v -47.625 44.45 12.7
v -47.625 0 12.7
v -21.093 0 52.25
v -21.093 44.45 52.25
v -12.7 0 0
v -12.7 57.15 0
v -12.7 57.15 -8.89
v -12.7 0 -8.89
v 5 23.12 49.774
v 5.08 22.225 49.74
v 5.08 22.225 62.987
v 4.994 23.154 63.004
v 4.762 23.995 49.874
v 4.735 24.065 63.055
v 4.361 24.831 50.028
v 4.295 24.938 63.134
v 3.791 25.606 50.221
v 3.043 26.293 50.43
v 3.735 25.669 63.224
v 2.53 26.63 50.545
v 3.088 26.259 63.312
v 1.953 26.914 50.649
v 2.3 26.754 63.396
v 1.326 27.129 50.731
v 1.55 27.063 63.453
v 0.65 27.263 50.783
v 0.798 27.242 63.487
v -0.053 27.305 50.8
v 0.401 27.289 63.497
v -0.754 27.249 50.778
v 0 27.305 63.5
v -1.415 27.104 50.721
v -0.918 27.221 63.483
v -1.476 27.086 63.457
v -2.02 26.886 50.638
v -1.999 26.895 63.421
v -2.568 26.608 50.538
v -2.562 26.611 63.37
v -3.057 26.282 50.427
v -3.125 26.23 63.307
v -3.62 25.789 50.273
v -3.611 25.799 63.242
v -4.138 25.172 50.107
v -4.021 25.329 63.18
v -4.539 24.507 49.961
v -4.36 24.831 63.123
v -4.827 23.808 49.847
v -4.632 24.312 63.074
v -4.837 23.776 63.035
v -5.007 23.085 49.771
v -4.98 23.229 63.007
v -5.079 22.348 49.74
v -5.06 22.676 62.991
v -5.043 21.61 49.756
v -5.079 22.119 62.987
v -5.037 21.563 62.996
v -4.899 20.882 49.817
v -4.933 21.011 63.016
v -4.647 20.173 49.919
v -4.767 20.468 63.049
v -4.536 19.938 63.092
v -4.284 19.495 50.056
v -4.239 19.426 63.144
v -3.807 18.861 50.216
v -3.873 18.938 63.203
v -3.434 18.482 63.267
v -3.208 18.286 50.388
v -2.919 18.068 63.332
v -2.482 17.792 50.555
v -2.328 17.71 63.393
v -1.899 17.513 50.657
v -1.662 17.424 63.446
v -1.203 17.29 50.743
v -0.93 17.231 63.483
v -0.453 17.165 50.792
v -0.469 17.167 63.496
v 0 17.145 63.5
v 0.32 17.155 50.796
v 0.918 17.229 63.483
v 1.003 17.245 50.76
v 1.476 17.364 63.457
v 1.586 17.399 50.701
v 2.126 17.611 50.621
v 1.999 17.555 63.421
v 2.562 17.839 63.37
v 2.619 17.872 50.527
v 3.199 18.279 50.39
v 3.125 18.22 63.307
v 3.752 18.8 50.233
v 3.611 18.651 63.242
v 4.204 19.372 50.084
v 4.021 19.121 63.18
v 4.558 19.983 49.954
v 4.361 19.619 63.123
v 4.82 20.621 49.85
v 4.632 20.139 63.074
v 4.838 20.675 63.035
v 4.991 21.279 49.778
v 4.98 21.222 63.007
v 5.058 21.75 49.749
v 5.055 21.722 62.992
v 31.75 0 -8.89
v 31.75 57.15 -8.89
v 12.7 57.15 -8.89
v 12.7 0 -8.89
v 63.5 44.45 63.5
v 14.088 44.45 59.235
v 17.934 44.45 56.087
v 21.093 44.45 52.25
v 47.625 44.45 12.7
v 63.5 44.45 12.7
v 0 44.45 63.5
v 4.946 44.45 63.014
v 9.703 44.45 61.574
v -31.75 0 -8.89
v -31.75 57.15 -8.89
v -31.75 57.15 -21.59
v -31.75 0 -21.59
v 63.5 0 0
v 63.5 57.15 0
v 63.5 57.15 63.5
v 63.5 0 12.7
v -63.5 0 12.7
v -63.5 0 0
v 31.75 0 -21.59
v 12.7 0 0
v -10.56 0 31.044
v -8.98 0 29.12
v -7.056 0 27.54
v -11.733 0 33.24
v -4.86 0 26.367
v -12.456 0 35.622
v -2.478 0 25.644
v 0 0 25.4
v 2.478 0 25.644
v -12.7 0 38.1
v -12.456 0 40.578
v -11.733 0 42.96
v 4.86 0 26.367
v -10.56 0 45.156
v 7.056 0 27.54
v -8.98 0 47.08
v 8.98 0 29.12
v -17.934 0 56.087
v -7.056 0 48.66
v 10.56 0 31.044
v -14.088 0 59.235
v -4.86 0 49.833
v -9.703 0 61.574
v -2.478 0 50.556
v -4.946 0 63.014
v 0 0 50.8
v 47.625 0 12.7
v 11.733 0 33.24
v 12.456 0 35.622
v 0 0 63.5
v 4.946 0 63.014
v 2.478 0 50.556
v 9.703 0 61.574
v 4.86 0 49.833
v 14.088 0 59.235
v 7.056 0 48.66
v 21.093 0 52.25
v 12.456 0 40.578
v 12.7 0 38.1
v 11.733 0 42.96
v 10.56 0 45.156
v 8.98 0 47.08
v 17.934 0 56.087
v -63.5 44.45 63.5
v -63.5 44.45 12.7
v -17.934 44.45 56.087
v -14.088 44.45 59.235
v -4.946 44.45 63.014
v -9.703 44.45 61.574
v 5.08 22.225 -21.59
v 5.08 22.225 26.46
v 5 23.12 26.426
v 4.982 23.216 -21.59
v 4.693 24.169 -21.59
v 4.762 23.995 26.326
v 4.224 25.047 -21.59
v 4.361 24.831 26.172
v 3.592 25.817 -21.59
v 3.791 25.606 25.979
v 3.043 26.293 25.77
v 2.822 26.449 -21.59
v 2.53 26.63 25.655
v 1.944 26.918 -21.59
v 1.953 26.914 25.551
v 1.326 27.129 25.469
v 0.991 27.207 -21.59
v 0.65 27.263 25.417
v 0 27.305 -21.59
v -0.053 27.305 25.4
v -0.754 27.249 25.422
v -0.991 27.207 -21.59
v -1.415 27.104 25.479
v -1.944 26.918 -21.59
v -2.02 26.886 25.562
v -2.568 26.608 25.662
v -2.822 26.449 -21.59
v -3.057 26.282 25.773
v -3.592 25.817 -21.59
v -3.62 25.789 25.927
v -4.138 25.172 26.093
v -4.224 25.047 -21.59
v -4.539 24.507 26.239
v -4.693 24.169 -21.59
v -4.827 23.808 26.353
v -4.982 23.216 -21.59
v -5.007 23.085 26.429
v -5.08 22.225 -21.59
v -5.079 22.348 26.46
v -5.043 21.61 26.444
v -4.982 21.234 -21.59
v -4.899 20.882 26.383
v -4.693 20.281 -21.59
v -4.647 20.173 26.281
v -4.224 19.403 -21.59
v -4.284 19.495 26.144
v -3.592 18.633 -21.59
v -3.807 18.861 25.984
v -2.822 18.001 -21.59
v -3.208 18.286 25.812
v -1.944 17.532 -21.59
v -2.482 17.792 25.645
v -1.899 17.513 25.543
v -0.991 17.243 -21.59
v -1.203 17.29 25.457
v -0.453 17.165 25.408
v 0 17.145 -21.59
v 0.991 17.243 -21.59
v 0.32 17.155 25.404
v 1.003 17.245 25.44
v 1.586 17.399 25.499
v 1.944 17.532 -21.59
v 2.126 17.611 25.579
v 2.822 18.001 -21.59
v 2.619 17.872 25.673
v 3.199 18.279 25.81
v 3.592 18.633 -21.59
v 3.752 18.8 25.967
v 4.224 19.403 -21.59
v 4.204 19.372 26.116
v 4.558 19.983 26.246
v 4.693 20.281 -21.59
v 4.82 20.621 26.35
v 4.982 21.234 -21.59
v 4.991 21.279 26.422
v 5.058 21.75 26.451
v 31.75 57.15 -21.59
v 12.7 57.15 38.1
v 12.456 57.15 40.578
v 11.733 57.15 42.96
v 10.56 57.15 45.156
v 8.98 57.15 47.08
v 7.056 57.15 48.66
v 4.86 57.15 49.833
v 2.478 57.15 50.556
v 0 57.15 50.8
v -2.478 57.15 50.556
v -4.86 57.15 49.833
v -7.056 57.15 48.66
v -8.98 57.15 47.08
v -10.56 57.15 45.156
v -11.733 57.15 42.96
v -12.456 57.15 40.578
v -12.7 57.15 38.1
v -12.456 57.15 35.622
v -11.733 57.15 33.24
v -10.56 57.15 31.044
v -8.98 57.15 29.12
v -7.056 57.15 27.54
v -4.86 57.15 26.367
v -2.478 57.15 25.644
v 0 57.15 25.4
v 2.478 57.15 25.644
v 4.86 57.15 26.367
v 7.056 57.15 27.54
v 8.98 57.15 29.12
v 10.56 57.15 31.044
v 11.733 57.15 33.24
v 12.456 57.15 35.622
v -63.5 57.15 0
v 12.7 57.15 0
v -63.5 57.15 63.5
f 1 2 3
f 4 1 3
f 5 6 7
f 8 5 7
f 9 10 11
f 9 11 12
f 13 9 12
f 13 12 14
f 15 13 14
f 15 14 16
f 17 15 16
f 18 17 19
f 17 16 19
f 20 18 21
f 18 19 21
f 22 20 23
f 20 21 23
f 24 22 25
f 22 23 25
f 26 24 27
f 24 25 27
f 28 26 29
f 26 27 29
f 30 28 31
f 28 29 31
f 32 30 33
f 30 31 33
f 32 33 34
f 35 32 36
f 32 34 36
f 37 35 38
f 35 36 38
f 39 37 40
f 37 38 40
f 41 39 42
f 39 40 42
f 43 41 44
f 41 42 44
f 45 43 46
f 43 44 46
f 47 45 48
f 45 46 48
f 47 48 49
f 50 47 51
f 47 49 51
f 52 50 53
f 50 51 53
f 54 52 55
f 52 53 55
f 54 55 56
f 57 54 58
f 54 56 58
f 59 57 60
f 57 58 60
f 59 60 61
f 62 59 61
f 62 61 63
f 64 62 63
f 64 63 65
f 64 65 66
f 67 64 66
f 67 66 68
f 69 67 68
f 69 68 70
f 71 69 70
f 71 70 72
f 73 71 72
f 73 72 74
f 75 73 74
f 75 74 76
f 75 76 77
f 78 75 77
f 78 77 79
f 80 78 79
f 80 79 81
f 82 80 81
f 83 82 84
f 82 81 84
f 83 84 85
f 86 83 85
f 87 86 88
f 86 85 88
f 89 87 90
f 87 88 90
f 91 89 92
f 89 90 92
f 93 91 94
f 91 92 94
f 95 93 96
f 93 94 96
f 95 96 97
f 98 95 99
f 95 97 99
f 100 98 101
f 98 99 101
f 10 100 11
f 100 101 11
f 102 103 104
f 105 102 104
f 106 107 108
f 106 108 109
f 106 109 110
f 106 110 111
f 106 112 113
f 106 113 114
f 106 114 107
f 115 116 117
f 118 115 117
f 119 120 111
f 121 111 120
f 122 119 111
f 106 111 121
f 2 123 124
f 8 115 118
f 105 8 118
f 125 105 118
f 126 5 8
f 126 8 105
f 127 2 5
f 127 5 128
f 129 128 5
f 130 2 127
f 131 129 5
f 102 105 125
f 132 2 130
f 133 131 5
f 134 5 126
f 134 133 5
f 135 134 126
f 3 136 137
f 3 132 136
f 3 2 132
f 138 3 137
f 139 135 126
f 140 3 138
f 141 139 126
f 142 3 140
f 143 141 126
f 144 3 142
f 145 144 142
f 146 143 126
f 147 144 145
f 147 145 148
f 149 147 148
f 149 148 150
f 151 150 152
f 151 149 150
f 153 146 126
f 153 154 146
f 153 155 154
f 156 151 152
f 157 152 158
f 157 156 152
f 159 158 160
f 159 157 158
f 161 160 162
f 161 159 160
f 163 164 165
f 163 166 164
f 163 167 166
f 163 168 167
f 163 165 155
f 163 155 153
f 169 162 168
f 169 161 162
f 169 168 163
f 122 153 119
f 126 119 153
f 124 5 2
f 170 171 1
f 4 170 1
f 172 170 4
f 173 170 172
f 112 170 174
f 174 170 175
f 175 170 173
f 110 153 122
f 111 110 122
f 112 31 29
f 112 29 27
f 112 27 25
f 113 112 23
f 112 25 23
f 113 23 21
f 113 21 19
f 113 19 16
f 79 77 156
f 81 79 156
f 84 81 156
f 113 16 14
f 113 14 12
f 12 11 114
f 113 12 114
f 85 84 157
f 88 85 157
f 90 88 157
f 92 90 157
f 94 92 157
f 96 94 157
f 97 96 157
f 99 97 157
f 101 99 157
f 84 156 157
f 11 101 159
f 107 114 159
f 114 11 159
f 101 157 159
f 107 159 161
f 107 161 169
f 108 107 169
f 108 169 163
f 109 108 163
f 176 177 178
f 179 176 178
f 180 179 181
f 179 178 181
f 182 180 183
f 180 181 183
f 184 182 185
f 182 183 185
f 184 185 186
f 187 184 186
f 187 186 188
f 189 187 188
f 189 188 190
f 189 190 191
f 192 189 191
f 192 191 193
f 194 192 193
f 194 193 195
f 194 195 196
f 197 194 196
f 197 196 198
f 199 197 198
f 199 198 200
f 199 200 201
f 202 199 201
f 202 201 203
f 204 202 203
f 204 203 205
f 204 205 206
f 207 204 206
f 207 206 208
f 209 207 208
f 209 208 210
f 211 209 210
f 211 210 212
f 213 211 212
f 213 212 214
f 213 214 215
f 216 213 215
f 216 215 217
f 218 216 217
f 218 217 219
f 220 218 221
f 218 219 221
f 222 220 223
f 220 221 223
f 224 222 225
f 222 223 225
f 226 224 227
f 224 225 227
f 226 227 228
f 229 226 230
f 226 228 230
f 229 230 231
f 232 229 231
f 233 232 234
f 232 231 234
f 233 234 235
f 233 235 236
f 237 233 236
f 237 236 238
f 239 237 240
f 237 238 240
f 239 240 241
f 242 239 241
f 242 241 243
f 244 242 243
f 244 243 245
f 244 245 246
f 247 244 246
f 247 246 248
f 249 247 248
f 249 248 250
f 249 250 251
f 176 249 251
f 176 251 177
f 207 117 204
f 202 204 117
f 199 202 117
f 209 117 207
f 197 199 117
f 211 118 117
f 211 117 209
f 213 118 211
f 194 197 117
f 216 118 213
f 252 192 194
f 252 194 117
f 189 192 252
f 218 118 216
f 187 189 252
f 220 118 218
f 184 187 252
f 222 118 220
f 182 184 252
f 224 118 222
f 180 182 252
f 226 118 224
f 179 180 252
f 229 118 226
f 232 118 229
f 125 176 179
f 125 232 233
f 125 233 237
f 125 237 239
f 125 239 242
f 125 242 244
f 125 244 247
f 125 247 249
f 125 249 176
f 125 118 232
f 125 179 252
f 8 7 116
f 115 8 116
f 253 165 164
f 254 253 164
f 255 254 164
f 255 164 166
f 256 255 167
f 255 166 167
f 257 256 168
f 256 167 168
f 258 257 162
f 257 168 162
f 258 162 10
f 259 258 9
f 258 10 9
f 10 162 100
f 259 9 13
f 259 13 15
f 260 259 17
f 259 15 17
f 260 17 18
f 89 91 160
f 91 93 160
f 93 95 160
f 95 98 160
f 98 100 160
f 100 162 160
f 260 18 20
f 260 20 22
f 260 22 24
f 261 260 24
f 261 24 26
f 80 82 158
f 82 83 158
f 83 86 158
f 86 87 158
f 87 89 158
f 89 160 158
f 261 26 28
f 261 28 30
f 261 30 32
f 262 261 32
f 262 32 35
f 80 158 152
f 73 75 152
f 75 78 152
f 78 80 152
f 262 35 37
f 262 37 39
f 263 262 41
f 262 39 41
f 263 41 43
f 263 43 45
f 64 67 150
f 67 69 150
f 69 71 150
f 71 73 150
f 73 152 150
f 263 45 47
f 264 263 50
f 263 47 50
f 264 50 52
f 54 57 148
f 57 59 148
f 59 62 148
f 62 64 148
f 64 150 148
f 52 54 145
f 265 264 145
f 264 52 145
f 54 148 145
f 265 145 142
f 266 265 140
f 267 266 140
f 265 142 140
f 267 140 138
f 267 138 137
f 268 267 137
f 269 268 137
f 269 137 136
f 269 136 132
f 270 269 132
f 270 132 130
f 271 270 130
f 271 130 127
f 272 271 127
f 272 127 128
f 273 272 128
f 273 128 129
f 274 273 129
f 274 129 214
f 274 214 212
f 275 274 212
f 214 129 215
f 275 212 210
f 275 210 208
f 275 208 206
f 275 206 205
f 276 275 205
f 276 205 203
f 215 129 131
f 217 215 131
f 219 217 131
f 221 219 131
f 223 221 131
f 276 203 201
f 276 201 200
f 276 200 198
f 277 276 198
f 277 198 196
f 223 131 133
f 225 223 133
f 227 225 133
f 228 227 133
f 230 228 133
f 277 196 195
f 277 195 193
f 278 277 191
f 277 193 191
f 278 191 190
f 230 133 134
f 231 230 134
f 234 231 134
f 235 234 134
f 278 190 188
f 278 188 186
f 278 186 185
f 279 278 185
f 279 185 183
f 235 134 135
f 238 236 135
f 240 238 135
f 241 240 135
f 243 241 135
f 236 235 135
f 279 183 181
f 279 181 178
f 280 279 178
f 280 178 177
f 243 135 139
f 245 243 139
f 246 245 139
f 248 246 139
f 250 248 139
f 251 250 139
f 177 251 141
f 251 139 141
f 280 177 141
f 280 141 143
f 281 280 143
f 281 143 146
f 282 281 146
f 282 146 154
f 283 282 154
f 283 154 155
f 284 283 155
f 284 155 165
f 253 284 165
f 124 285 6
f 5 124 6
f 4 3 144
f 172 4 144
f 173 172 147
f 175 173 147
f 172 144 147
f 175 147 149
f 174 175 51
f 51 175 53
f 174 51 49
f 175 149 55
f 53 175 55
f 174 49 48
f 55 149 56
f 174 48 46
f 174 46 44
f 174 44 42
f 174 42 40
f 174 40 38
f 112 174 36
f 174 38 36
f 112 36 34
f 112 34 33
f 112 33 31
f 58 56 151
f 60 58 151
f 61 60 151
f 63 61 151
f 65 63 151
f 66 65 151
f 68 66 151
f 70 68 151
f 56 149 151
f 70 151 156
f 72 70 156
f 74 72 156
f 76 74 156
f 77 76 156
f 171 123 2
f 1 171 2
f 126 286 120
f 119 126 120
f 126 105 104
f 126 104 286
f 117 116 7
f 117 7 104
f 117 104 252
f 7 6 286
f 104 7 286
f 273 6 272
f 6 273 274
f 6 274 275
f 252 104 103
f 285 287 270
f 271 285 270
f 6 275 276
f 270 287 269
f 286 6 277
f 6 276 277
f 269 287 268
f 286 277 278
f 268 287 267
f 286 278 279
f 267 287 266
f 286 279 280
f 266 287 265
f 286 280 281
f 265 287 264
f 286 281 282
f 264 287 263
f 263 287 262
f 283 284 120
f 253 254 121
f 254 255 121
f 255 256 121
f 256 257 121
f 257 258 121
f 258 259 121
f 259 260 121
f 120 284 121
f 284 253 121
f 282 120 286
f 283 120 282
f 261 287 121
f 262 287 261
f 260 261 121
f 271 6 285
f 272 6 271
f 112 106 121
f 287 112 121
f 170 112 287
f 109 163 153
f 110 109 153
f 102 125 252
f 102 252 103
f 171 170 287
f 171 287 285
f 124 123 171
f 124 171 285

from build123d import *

# Parameters (mm, degrees)
F1_DEPTH = 57.15
F3_DEPTH = 44.45
F4_DEPTH = 44.45
F2_R     = 12.7
F5_DEPTH = 57.151
F6_R     = 5.08
F7_DEPTH = 85.091


with BuildPart() as f1:
    # F0 (on Front) → F1 (new body)
    with BuildSketch(Plane.XZ):
        Polygon((12.7, 0), (63.5, 0), (63.5, 63.5), (-63.5, 63.5), (-63.5, 0), (-12.7, 0), (-12.7, -8.89), (-31.75, -8.89), (-31.75, -21.59), (31.75, -21.59), (31.75, -8.89), (12.7, -8.89), align=None)
    extrude(amount=-F1_DEPTH)

    # F2 (on face) → F3 (cut)
    with BuildSketch(Plane.XZ):
        with BuildLine():
            Line((63.5, 63.5), (0, 63.5))
            ThreePointArc((0, 63.5), (11.952941, 60.511765), (21.093426, 52.250173))
            Line((21.093426, 52.250173), (47.625, 12.7))
            Line((47.625, 12.7), (63.5, 12.7))
            Line((63.5, 12.7), (63.5, 63.5))
        make_face()
    extrude(amount=-F3_DEPTH, mode=Mode.SUBTRACT)

    # F2 (on face) → F4 (cut)
    with BuildSketch(Plane.XZ):
        with BuildLine():
            Line((-47.625, 12.7), (-21.093426, 52.250173))
            ThreePointArc((-21.093426, 52.250173), (-11.952941, 60.511765), (0, 63.5))
            Line((0, 63.5), (-63.5, 63.5))
            Line((-63.5, 63.5), (-63.5, 12.7))
            Line((-63.5, 12.7), (-47.625, 12.7))
        make_face()
    extrude(amount=-F4_DEPTH, mode=Mode.SUBTRACT)

    # F2 (on face) → F5 (cut, through all)
    with BuildSketch(Plane.XZ):
        with Locations((0, 38.1)):
            Circle(F2_R)
    extrude(amount=-F5_DEPTH, mode=Mode.SUBTRACT)

    # F6 (on face) → F7 (cut, through all)
    with BuildSketch(Plane.XY.offset(63.5)):
        with Locations((0, 22.225)):
            Circle(F6_R)
    extrude(amount=-F7_DEPTH, mode=Mode.SUBTRACT)


solid = f1.part
